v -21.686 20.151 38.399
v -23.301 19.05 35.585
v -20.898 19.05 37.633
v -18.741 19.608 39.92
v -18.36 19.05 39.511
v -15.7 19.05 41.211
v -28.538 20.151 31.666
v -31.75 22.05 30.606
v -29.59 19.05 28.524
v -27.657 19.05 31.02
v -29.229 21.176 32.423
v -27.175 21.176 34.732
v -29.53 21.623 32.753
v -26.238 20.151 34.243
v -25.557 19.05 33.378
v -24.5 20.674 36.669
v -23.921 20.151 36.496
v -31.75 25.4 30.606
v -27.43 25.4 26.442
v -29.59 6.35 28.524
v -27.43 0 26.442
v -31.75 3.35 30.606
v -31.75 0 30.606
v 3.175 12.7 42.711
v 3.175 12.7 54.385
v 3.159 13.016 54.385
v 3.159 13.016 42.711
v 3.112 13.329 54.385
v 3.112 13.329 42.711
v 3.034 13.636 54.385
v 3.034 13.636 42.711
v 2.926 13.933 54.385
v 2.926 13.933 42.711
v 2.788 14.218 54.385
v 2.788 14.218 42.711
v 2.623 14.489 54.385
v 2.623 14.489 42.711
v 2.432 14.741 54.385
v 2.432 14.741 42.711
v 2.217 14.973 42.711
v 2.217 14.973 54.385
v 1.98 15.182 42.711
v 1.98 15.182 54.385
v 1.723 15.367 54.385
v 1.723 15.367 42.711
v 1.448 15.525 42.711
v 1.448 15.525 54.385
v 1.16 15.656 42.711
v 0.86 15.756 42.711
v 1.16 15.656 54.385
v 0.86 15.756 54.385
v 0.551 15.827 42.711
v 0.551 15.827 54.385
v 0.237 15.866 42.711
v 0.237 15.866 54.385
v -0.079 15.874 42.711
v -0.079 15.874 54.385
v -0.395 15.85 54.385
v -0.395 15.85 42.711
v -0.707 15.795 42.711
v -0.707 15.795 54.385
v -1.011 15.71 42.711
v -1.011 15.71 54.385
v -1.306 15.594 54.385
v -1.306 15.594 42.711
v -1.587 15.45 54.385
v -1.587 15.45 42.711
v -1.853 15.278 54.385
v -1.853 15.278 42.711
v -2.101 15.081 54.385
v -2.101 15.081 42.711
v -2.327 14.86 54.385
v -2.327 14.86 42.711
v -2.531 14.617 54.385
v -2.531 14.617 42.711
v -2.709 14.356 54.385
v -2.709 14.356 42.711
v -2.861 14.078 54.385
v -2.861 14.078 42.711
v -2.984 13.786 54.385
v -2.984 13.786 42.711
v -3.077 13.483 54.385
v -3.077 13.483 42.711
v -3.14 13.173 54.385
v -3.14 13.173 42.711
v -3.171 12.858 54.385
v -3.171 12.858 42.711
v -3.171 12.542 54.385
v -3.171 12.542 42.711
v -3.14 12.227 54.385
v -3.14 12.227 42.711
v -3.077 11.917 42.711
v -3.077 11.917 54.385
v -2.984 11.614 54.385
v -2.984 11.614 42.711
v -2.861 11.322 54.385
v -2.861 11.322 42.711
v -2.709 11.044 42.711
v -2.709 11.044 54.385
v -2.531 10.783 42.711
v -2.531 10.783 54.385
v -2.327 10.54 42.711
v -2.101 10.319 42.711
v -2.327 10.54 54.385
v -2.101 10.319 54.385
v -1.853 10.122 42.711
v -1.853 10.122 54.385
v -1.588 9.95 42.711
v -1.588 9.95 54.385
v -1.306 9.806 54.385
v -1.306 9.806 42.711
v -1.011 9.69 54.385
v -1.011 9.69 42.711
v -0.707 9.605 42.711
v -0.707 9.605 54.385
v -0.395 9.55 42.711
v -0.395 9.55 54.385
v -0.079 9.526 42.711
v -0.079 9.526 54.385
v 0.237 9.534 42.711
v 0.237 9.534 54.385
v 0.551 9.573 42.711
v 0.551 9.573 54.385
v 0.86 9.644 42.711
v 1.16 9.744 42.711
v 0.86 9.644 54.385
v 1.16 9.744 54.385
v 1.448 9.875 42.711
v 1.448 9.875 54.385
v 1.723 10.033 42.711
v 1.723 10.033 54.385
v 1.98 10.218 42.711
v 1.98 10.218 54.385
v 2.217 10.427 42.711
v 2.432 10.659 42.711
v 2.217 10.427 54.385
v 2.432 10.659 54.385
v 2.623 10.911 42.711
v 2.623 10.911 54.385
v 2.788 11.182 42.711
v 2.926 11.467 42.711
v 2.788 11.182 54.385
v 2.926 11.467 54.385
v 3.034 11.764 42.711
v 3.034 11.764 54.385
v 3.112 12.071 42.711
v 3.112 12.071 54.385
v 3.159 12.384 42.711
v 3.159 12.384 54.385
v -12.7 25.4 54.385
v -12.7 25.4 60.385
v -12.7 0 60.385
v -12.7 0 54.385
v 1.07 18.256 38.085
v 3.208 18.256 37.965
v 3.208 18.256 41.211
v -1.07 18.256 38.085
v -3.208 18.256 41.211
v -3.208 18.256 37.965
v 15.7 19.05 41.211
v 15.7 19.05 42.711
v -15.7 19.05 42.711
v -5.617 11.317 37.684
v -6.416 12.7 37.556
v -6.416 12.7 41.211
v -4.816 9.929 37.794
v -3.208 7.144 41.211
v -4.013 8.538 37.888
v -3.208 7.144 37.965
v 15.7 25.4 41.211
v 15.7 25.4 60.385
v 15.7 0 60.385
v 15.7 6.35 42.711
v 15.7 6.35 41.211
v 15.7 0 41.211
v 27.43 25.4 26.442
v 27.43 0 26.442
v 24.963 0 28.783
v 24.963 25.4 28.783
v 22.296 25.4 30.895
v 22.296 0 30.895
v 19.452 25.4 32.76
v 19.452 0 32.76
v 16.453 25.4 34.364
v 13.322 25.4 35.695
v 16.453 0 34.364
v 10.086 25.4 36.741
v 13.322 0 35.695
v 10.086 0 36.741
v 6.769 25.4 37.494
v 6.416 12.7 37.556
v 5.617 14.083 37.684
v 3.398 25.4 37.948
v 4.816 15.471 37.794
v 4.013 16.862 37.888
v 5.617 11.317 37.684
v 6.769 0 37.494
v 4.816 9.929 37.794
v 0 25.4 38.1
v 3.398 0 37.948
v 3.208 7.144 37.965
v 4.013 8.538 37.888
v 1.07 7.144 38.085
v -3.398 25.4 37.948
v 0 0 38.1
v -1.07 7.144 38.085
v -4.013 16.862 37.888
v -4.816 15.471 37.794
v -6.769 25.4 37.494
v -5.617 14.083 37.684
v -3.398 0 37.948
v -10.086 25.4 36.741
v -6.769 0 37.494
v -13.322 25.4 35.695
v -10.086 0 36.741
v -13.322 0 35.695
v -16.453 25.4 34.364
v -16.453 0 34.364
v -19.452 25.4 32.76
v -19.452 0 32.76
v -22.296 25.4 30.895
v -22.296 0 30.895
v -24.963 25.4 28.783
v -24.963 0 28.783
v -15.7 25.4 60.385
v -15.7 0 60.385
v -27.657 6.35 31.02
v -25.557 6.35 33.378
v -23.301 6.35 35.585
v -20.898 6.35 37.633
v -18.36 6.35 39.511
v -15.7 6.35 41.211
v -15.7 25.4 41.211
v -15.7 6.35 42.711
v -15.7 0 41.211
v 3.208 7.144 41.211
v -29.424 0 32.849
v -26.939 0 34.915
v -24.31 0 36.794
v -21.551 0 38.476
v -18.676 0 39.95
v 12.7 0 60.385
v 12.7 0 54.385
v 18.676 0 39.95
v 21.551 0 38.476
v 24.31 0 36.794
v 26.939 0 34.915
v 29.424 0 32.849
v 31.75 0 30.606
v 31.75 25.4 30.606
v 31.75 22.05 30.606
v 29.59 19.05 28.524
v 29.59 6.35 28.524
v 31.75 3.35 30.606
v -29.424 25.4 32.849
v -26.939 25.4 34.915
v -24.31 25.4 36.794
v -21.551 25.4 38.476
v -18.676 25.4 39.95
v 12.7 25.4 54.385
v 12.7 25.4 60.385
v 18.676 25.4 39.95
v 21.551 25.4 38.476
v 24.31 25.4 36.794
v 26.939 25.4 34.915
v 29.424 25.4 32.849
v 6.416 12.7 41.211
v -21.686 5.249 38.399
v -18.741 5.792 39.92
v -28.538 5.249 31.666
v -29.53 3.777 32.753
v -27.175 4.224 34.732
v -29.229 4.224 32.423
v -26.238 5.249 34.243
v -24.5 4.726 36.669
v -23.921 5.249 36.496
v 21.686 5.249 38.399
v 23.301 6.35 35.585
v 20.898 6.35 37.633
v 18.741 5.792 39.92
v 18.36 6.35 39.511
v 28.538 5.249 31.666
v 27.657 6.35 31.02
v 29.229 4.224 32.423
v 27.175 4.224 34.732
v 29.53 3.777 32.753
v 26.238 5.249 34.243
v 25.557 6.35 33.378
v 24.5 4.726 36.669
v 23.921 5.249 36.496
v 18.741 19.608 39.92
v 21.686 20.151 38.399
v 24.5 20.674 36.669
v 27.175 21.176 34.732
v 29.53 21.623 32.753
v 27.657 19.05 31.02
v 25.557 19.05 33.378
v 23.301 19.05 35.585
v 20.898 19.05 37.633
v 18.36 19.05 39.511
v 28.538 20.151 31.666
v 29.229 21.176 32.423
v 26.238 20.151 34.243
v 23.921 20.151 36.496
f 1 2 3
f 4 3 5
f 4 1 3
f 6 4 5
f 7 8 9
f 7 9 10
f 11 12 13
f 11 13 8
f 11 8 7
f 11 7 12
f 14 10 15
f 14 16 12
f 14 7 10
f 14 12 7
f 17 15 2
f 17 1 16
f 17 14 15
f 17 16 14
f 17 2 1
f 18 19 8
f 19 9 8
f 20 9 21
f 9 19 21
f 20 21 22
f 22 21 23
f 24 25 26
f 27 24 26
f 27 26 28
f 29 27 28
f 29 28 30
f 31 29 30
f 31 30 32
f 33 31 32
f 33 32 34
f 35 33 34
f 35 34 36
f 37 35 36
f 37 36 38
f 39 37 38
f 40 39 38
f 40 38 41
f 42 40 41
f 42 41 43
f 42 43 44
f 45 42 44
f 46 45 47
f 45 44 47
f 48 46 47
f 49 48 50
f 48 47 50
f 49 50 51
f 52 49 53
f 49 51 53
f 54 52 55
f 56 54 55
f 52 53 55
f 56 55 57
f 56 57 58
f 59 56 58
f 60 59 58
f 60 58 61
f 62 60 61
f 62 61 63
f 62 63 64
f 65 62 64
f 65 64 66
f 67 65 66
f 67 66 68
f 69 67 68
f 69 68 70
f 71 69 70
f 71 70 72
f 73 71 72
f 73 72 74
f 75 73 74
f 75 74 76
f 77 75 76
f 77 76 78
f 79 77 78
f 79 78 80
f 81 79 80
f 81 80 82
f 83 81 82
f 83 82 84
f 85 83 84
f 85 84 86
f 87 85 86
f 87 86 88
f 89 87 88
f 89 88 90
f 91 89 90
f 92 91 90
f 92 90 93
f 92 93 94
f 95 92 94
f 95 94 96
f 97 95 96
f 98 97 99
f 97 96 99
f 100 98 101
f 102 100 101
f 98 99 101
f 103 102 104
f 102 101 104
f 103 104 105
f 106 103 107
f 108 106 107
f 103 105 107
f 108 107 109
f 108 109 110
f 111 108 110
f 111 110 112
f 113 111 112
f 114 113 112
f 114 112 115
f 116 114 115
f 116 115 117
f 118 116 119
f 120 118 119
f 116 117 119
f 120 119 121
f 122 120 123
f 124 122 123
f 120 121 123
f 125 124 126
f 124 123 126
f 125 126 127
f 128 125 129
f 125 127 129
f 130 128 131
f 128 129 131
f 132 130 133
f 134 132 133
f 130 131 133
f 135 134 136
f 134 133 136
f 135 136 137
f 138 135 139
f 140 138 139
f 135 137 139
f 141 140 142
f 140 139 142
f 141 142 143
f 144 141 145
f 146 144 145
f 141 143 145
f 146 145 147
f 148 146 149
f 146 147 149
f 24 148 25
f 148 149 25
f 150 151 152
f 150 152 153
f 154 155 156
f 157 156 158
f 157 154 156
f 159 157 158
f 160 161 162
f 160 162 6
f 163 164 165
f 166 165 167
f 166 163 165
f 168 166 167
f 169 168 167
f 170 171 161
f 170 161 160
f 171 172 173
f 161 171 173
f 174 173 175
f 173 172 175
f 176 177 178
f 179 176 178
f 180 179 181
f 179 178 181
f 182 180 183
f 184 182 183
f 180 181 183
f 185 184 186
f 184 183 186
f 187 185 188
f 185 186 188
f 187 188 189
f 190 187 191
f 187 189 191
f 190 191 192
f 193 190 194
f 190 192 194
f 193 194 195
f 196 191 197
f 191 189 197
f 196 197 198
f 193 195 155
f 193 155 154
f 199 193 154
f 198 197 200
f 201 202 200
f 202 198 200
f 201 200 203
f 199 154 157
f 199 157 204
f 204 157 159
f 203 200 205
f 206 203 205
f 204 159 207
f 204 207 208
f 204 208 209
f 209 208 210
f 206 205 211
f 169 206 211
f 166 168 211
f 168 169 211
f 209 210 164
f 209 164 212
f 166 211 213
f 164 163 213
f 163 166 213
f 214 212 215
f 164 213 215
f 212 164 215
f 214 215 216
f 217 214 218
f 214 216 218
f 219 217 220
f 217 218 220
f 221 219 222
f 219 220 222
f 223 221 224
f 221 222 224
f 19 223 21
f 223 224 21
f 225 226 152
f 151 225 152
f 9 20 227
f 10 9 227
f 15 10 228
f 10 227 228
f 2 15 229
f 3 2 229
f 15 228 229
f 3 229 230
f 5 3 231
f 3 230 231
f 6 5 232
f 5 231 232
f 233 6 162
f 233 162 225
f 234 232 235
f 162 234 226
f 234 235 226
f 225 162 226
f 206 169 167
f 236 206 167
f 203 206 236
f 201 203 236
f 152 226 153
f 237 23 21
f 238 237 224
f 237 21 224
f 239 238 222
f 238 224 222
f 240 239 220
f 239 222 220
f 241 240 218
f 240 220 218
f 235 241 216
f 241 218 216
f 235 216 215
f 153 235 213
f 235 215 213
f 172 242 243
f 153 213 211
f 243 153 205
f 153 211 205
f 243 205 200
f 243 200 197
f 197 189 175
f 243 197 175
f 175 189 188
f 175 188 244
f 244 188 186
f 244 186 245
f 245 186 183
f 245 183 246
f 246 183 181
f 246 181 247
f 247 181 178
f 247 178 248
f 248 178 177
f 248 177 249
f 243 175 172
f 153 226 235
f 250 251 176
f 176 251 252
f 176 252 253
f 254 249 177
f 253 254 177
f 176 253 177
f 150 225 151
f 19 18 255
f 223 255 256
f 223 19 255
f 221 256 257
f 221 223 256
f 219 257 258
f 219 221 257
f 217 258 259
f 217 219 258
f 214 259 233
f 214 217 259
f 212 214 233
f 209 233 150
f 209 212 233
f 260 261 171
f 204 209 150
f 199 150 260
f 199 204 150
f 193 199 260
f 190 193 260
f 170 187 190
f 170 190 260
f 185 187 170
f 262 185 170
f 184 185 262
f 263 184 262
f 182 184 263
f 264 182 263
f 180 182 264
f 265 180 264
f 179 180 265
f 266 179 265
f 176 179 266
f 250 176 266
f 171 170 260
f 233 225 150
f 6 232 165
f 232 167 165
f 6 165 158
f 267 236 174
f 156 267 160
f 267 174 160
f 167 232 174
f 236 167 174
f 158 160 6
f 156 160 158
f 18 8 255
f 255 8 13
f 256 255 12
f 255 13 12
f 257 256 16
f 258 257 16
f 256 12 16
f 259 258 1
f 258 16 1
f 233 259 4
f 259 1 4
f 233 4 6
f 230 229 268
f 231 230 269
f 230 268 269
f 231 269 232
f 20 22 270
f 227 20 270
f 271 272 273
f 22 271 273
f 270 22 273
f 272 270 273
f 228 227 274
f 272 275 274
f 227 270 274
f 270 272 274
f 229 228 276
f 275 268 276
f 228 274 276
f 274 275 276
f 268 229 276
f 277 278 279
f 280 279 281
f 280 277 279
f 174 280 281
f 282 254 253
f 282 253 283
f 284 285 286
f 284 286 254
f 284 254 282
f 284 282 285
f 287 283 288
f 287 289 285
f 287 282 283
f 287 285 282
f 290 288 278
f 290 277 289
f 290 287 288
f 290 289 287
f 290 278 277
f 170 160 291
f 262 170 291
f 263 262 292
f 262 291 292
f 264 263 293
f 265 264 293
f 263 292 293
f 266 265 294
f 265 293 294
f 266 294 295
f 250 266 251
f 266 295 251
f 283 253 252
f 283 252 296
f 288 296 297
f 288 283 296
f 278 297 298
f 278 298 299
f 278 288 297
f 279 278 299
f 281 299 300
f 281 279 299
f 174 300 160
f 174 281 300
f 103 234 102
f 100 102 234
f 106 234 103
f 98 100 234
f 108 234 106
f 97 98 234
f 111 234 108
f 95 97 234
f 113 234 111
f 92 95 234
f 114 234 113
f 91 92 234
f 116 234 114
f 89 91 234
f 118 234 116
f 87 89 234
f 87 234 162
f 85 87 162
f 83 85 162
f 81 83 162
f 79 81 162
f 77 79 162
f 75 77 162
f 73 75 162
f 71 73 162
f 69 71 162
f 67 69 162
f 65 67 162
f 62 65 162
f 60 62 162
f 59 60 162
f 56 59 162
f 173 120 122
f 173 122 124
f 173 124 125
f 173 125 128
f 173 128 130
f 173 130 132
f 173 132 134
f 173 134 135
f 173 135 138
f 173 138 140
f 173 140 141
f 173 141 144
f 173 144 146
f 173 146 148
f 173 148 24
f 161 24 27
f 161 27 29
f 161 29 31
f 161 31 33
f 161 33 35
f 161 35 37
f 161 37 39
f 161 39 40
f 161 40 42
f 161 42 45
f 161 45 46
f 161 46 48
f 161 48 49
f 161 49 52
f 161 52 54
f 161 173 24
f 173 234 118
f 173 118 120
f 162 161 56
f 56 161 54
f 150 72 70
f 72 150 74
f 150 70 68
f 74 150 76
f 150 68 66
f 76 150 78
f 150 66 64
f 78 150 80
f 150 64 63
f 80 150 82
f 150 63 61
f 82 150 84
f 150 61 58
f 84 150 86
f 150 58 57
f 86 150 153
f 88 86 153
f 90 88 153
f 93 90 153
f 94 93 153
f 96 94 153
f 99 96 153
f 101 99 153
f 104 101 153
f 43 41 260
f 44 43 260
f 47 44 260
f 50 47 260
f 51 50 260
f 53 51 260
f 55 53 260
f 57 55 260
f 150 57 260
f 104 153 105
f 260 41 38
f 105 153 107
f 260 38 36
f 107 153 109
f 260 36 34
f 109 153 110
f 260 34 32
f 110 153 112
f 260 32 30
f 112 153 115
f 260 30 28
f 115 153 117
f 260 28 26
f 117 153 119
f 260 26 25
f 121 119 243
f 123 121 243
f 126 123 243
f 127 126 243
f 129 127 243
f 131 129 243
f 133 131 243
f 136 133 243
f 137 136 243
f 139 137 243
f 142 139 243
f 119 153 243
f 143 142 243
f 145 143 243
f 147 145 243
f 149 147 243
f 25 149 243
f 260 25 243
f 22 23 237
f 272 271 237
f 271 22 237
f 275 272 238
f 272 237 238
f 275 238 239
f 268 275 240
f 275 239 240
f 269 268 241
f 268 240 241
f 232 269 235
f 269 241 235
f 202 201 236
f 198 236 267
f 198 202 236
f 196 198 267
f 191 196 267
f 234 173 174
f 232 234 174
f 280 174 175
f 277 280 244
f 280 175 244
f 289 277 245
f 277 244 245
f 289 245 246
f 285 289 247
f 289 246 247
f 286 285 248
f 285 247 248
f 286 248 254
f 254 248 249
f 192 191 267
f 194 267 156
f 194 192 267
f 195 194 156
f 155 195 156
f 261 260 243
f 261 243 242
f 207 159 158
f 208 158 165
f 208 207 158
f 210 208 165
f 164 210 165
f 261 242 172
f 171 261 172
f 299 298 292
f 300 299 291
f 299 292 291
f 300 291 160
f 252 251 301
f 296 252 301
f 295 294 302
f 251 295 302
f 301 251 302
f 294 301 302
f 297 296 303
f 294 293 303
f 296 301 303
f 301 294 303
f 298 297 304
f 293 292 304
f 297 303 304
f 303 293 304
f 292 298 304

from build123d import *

# Parameters (mm, degrees)
BOSS_EXTRUDE1_DEPTH     = 25.4
SKETCH2_W               = 1.5
SKETCH2_H               = 12.7
CUT_EXTRUDE1_DEPTH      = 81.888878871
CUT_EXTRUDE2_DEPTH      = 12.7
SKETCH6_R               = 3.175
CUT_EXTRUDE4_DEPTH      = 50.335811816
CUT_EXTRUDE5_DEPTH      = 4.365625
CUT_EXTRUDE5_DEPTH_BACK = 47.366407345


with BuildPart() as part:
    # Sketch1 → Boss-Extrude1 (new body)
    with BuildSketch(Plane(origin=(0, 0, 0), x_dir=(1, 0, 0), z_dir=(0, 1, 0))):
        with BuildLine():
            Line((-12.7, -54.385), (12.7, -54.385))
            Line((12.7, -54.385), (12.7, -60.385))
            Line((12.7, -60.385), (15.7, -60.385))
            Line((15.7, -60.385), (15.7, -41.210678228))
            ThreePointArc((15.7, -41.210678228), (24.31025853, -36.794311112), (31.75, -30.606331044))
            Line((31.75, -30.606331044), (27.430272109, -26.442204372))
            ThreePointArc((27.430272109, -26.442204372), (0, -38.1), (-27.430272109, -26.442204372))
            Line((-27.430272109, -26.442204372), (-31.75, -30.606331044))
            ThreePointArc((-31.75, -30.606331044), (-24.31025853, -36.794311112), (-15.7, -41.210678228))
            Line((-15.7, -41.210678228), (-15.7, -60.385))
            Line((-15.7, -60.385), (-12.7, -60.385))
            Line((-12.7, -60.385), (-12.7, -54.385))
        make_face()
    extrude(amount=BOSS_EXTRUDE1_DEPTH)

    # Sketch2 → Cut-Extrude1 (cut, through all)
    with BuildSketch(Plane(origin=(15.7, 0, 0), x_dir=(0, 0, -1), z_dir=(1, 0, 0))):
        with Locations((-41.960678228, 12.7)):
            Rectangle(SKETCH2_W, SKETCH2_H)
    extrude(amount=-CUT_EXTRUDE1_DEPTH, mode=Mode.SUBTRACT)

    # Sketch3 → Cut-Extrude2 (cut)
    with BuildSketch(Plane(origin=(0, 6.35, 0), x_dir=(1, 0, 0), z_dir=(0, 1, 0))):
        with BuildLine():
            Line((31.75, -30.606331044), (29.590136054, -28.524267708))
            ThreePointArc((29.590136054, -28.524267708), (23.300825781, -35.585451028), (15.7, -41.210678228))
            ThreePointArc((15.7, -41.210678228), (24.31025853, -36.794311112), (31.75, -30.606331044))
        make_face()
    cut_extrude2 = extrude(amount=CUT_EXTRUDE2_DEPTH, mode=Mode.SUBTRACT)

    # Mirror1: Cut-Extrude2 across plane
    add(cut_extrude2.mirror(Plane(origin=(0, 0, 0), x_dir=(0, 0, 1), z_dir=(1, 0, 0))), mode=Mode.SUBTRACT)

    # Sketch6 → Cut-Extrude4 (cut, through all)
    with BuildSketch(Plane.XY.offset(54.385)):
        with Locations((0, 12.7)):
            Circle(SKETCH6_R)
    extrude(amount=-CUT_EXTRUDE4_DEPTH, mode=Mode.SUBTRACT)

    # Sketch7 → Cut-Extrude5 (cut, two sides: drawn at the far end of the back side and taken through both)
    with BuildSketch(Plane.XY.offset(38.1).offset(-CUT_EXTRUDE5_DEPTH_BACK)):
        Polygon((6.415804866, 12.7), (3.207902433, 18.25625), (-3.207902433, 18.25625), (-6.415804866, 12.7), (-3.207902433, 7.14375), (3.207902433, 7.14375), align=None)
    extrude(amount=CUT_EXTRUDE5_DEPTH + CUT_EXTRUDE5_DEPTH_BACK, mode=Mode.SUBTRACT)

    # Cut-Sweep1: sweep along a path in Sketch9
    with BuildLine(Plane.XZ.offset(-19.05)) as cut_sweep1_path:
        ThreePointArc((29.590136054, 28.524267708), (23.300825781, 35.585451028), (15.7, 41.210678228))
    # Sketch8 → Cut-Sweep1 (sweep, cut)
    with BuildSketch(Plane(origin=(0, 0, 0), x_dir=(-0.7199546485260769, 0, -0.6940211121181352), z_dir=(0.6940211121181352, 0, -0.7199546485260769))):
        Polygon((-44.1, 19.05), (-41.1, 19.05), (-44.1, 22.05), align=None)
    cut_sweep1 = sweep(path=cut_sweep1_path.line, mode=Mode.SUBTRACT)

    # Mirror2: Cut-Sweep1 across plane
    add(cut_sweep1.mirror(Plane.ZX.offset(12.7)), mode=Mode.SUBTRACT)

    # Mirror3: Cut-Sweep1 across plane
    add(cut_sweep1.mirror(Plane(origin=(0, 0, 0), x_dir=(0, 0, 1), z_dir=(1, 0, 0))), mode=Mode.SUBTRACT)

    # Mirror3 copy 1: sweep along a path in Mirror3 copy 1 path
    with BuildLine(Plane(origin=(0, 6.35, 0), x_dir=(-1, 0, 0), z_dir=(0, 1, 0))) as mirror3_copy_1_path:
        ThreePointArc((29.590136054, 28.524267708), (23.300825781, 35.585451028), (15.7, 41.210678228))
    # Mirror3 copy 1 sketch → Mirror3 copy 1 (sweep, cut)
    with BuildSketch(Plane(origin=(0, 25.4, 0), x_dir=(0.7199546485260769, 0, -0.6940211121181352), z_dir=(-0.6940211121181352, 0, -0.7199546485260769))):
        Polygon((-44.1, 19.05), (-41.1, 19.05), (-44.1, 22.05), align=None)
    sweep(path=mirror3_copy_1_path.line, mode=Mode.SUBTRACT)


solid = part.part
